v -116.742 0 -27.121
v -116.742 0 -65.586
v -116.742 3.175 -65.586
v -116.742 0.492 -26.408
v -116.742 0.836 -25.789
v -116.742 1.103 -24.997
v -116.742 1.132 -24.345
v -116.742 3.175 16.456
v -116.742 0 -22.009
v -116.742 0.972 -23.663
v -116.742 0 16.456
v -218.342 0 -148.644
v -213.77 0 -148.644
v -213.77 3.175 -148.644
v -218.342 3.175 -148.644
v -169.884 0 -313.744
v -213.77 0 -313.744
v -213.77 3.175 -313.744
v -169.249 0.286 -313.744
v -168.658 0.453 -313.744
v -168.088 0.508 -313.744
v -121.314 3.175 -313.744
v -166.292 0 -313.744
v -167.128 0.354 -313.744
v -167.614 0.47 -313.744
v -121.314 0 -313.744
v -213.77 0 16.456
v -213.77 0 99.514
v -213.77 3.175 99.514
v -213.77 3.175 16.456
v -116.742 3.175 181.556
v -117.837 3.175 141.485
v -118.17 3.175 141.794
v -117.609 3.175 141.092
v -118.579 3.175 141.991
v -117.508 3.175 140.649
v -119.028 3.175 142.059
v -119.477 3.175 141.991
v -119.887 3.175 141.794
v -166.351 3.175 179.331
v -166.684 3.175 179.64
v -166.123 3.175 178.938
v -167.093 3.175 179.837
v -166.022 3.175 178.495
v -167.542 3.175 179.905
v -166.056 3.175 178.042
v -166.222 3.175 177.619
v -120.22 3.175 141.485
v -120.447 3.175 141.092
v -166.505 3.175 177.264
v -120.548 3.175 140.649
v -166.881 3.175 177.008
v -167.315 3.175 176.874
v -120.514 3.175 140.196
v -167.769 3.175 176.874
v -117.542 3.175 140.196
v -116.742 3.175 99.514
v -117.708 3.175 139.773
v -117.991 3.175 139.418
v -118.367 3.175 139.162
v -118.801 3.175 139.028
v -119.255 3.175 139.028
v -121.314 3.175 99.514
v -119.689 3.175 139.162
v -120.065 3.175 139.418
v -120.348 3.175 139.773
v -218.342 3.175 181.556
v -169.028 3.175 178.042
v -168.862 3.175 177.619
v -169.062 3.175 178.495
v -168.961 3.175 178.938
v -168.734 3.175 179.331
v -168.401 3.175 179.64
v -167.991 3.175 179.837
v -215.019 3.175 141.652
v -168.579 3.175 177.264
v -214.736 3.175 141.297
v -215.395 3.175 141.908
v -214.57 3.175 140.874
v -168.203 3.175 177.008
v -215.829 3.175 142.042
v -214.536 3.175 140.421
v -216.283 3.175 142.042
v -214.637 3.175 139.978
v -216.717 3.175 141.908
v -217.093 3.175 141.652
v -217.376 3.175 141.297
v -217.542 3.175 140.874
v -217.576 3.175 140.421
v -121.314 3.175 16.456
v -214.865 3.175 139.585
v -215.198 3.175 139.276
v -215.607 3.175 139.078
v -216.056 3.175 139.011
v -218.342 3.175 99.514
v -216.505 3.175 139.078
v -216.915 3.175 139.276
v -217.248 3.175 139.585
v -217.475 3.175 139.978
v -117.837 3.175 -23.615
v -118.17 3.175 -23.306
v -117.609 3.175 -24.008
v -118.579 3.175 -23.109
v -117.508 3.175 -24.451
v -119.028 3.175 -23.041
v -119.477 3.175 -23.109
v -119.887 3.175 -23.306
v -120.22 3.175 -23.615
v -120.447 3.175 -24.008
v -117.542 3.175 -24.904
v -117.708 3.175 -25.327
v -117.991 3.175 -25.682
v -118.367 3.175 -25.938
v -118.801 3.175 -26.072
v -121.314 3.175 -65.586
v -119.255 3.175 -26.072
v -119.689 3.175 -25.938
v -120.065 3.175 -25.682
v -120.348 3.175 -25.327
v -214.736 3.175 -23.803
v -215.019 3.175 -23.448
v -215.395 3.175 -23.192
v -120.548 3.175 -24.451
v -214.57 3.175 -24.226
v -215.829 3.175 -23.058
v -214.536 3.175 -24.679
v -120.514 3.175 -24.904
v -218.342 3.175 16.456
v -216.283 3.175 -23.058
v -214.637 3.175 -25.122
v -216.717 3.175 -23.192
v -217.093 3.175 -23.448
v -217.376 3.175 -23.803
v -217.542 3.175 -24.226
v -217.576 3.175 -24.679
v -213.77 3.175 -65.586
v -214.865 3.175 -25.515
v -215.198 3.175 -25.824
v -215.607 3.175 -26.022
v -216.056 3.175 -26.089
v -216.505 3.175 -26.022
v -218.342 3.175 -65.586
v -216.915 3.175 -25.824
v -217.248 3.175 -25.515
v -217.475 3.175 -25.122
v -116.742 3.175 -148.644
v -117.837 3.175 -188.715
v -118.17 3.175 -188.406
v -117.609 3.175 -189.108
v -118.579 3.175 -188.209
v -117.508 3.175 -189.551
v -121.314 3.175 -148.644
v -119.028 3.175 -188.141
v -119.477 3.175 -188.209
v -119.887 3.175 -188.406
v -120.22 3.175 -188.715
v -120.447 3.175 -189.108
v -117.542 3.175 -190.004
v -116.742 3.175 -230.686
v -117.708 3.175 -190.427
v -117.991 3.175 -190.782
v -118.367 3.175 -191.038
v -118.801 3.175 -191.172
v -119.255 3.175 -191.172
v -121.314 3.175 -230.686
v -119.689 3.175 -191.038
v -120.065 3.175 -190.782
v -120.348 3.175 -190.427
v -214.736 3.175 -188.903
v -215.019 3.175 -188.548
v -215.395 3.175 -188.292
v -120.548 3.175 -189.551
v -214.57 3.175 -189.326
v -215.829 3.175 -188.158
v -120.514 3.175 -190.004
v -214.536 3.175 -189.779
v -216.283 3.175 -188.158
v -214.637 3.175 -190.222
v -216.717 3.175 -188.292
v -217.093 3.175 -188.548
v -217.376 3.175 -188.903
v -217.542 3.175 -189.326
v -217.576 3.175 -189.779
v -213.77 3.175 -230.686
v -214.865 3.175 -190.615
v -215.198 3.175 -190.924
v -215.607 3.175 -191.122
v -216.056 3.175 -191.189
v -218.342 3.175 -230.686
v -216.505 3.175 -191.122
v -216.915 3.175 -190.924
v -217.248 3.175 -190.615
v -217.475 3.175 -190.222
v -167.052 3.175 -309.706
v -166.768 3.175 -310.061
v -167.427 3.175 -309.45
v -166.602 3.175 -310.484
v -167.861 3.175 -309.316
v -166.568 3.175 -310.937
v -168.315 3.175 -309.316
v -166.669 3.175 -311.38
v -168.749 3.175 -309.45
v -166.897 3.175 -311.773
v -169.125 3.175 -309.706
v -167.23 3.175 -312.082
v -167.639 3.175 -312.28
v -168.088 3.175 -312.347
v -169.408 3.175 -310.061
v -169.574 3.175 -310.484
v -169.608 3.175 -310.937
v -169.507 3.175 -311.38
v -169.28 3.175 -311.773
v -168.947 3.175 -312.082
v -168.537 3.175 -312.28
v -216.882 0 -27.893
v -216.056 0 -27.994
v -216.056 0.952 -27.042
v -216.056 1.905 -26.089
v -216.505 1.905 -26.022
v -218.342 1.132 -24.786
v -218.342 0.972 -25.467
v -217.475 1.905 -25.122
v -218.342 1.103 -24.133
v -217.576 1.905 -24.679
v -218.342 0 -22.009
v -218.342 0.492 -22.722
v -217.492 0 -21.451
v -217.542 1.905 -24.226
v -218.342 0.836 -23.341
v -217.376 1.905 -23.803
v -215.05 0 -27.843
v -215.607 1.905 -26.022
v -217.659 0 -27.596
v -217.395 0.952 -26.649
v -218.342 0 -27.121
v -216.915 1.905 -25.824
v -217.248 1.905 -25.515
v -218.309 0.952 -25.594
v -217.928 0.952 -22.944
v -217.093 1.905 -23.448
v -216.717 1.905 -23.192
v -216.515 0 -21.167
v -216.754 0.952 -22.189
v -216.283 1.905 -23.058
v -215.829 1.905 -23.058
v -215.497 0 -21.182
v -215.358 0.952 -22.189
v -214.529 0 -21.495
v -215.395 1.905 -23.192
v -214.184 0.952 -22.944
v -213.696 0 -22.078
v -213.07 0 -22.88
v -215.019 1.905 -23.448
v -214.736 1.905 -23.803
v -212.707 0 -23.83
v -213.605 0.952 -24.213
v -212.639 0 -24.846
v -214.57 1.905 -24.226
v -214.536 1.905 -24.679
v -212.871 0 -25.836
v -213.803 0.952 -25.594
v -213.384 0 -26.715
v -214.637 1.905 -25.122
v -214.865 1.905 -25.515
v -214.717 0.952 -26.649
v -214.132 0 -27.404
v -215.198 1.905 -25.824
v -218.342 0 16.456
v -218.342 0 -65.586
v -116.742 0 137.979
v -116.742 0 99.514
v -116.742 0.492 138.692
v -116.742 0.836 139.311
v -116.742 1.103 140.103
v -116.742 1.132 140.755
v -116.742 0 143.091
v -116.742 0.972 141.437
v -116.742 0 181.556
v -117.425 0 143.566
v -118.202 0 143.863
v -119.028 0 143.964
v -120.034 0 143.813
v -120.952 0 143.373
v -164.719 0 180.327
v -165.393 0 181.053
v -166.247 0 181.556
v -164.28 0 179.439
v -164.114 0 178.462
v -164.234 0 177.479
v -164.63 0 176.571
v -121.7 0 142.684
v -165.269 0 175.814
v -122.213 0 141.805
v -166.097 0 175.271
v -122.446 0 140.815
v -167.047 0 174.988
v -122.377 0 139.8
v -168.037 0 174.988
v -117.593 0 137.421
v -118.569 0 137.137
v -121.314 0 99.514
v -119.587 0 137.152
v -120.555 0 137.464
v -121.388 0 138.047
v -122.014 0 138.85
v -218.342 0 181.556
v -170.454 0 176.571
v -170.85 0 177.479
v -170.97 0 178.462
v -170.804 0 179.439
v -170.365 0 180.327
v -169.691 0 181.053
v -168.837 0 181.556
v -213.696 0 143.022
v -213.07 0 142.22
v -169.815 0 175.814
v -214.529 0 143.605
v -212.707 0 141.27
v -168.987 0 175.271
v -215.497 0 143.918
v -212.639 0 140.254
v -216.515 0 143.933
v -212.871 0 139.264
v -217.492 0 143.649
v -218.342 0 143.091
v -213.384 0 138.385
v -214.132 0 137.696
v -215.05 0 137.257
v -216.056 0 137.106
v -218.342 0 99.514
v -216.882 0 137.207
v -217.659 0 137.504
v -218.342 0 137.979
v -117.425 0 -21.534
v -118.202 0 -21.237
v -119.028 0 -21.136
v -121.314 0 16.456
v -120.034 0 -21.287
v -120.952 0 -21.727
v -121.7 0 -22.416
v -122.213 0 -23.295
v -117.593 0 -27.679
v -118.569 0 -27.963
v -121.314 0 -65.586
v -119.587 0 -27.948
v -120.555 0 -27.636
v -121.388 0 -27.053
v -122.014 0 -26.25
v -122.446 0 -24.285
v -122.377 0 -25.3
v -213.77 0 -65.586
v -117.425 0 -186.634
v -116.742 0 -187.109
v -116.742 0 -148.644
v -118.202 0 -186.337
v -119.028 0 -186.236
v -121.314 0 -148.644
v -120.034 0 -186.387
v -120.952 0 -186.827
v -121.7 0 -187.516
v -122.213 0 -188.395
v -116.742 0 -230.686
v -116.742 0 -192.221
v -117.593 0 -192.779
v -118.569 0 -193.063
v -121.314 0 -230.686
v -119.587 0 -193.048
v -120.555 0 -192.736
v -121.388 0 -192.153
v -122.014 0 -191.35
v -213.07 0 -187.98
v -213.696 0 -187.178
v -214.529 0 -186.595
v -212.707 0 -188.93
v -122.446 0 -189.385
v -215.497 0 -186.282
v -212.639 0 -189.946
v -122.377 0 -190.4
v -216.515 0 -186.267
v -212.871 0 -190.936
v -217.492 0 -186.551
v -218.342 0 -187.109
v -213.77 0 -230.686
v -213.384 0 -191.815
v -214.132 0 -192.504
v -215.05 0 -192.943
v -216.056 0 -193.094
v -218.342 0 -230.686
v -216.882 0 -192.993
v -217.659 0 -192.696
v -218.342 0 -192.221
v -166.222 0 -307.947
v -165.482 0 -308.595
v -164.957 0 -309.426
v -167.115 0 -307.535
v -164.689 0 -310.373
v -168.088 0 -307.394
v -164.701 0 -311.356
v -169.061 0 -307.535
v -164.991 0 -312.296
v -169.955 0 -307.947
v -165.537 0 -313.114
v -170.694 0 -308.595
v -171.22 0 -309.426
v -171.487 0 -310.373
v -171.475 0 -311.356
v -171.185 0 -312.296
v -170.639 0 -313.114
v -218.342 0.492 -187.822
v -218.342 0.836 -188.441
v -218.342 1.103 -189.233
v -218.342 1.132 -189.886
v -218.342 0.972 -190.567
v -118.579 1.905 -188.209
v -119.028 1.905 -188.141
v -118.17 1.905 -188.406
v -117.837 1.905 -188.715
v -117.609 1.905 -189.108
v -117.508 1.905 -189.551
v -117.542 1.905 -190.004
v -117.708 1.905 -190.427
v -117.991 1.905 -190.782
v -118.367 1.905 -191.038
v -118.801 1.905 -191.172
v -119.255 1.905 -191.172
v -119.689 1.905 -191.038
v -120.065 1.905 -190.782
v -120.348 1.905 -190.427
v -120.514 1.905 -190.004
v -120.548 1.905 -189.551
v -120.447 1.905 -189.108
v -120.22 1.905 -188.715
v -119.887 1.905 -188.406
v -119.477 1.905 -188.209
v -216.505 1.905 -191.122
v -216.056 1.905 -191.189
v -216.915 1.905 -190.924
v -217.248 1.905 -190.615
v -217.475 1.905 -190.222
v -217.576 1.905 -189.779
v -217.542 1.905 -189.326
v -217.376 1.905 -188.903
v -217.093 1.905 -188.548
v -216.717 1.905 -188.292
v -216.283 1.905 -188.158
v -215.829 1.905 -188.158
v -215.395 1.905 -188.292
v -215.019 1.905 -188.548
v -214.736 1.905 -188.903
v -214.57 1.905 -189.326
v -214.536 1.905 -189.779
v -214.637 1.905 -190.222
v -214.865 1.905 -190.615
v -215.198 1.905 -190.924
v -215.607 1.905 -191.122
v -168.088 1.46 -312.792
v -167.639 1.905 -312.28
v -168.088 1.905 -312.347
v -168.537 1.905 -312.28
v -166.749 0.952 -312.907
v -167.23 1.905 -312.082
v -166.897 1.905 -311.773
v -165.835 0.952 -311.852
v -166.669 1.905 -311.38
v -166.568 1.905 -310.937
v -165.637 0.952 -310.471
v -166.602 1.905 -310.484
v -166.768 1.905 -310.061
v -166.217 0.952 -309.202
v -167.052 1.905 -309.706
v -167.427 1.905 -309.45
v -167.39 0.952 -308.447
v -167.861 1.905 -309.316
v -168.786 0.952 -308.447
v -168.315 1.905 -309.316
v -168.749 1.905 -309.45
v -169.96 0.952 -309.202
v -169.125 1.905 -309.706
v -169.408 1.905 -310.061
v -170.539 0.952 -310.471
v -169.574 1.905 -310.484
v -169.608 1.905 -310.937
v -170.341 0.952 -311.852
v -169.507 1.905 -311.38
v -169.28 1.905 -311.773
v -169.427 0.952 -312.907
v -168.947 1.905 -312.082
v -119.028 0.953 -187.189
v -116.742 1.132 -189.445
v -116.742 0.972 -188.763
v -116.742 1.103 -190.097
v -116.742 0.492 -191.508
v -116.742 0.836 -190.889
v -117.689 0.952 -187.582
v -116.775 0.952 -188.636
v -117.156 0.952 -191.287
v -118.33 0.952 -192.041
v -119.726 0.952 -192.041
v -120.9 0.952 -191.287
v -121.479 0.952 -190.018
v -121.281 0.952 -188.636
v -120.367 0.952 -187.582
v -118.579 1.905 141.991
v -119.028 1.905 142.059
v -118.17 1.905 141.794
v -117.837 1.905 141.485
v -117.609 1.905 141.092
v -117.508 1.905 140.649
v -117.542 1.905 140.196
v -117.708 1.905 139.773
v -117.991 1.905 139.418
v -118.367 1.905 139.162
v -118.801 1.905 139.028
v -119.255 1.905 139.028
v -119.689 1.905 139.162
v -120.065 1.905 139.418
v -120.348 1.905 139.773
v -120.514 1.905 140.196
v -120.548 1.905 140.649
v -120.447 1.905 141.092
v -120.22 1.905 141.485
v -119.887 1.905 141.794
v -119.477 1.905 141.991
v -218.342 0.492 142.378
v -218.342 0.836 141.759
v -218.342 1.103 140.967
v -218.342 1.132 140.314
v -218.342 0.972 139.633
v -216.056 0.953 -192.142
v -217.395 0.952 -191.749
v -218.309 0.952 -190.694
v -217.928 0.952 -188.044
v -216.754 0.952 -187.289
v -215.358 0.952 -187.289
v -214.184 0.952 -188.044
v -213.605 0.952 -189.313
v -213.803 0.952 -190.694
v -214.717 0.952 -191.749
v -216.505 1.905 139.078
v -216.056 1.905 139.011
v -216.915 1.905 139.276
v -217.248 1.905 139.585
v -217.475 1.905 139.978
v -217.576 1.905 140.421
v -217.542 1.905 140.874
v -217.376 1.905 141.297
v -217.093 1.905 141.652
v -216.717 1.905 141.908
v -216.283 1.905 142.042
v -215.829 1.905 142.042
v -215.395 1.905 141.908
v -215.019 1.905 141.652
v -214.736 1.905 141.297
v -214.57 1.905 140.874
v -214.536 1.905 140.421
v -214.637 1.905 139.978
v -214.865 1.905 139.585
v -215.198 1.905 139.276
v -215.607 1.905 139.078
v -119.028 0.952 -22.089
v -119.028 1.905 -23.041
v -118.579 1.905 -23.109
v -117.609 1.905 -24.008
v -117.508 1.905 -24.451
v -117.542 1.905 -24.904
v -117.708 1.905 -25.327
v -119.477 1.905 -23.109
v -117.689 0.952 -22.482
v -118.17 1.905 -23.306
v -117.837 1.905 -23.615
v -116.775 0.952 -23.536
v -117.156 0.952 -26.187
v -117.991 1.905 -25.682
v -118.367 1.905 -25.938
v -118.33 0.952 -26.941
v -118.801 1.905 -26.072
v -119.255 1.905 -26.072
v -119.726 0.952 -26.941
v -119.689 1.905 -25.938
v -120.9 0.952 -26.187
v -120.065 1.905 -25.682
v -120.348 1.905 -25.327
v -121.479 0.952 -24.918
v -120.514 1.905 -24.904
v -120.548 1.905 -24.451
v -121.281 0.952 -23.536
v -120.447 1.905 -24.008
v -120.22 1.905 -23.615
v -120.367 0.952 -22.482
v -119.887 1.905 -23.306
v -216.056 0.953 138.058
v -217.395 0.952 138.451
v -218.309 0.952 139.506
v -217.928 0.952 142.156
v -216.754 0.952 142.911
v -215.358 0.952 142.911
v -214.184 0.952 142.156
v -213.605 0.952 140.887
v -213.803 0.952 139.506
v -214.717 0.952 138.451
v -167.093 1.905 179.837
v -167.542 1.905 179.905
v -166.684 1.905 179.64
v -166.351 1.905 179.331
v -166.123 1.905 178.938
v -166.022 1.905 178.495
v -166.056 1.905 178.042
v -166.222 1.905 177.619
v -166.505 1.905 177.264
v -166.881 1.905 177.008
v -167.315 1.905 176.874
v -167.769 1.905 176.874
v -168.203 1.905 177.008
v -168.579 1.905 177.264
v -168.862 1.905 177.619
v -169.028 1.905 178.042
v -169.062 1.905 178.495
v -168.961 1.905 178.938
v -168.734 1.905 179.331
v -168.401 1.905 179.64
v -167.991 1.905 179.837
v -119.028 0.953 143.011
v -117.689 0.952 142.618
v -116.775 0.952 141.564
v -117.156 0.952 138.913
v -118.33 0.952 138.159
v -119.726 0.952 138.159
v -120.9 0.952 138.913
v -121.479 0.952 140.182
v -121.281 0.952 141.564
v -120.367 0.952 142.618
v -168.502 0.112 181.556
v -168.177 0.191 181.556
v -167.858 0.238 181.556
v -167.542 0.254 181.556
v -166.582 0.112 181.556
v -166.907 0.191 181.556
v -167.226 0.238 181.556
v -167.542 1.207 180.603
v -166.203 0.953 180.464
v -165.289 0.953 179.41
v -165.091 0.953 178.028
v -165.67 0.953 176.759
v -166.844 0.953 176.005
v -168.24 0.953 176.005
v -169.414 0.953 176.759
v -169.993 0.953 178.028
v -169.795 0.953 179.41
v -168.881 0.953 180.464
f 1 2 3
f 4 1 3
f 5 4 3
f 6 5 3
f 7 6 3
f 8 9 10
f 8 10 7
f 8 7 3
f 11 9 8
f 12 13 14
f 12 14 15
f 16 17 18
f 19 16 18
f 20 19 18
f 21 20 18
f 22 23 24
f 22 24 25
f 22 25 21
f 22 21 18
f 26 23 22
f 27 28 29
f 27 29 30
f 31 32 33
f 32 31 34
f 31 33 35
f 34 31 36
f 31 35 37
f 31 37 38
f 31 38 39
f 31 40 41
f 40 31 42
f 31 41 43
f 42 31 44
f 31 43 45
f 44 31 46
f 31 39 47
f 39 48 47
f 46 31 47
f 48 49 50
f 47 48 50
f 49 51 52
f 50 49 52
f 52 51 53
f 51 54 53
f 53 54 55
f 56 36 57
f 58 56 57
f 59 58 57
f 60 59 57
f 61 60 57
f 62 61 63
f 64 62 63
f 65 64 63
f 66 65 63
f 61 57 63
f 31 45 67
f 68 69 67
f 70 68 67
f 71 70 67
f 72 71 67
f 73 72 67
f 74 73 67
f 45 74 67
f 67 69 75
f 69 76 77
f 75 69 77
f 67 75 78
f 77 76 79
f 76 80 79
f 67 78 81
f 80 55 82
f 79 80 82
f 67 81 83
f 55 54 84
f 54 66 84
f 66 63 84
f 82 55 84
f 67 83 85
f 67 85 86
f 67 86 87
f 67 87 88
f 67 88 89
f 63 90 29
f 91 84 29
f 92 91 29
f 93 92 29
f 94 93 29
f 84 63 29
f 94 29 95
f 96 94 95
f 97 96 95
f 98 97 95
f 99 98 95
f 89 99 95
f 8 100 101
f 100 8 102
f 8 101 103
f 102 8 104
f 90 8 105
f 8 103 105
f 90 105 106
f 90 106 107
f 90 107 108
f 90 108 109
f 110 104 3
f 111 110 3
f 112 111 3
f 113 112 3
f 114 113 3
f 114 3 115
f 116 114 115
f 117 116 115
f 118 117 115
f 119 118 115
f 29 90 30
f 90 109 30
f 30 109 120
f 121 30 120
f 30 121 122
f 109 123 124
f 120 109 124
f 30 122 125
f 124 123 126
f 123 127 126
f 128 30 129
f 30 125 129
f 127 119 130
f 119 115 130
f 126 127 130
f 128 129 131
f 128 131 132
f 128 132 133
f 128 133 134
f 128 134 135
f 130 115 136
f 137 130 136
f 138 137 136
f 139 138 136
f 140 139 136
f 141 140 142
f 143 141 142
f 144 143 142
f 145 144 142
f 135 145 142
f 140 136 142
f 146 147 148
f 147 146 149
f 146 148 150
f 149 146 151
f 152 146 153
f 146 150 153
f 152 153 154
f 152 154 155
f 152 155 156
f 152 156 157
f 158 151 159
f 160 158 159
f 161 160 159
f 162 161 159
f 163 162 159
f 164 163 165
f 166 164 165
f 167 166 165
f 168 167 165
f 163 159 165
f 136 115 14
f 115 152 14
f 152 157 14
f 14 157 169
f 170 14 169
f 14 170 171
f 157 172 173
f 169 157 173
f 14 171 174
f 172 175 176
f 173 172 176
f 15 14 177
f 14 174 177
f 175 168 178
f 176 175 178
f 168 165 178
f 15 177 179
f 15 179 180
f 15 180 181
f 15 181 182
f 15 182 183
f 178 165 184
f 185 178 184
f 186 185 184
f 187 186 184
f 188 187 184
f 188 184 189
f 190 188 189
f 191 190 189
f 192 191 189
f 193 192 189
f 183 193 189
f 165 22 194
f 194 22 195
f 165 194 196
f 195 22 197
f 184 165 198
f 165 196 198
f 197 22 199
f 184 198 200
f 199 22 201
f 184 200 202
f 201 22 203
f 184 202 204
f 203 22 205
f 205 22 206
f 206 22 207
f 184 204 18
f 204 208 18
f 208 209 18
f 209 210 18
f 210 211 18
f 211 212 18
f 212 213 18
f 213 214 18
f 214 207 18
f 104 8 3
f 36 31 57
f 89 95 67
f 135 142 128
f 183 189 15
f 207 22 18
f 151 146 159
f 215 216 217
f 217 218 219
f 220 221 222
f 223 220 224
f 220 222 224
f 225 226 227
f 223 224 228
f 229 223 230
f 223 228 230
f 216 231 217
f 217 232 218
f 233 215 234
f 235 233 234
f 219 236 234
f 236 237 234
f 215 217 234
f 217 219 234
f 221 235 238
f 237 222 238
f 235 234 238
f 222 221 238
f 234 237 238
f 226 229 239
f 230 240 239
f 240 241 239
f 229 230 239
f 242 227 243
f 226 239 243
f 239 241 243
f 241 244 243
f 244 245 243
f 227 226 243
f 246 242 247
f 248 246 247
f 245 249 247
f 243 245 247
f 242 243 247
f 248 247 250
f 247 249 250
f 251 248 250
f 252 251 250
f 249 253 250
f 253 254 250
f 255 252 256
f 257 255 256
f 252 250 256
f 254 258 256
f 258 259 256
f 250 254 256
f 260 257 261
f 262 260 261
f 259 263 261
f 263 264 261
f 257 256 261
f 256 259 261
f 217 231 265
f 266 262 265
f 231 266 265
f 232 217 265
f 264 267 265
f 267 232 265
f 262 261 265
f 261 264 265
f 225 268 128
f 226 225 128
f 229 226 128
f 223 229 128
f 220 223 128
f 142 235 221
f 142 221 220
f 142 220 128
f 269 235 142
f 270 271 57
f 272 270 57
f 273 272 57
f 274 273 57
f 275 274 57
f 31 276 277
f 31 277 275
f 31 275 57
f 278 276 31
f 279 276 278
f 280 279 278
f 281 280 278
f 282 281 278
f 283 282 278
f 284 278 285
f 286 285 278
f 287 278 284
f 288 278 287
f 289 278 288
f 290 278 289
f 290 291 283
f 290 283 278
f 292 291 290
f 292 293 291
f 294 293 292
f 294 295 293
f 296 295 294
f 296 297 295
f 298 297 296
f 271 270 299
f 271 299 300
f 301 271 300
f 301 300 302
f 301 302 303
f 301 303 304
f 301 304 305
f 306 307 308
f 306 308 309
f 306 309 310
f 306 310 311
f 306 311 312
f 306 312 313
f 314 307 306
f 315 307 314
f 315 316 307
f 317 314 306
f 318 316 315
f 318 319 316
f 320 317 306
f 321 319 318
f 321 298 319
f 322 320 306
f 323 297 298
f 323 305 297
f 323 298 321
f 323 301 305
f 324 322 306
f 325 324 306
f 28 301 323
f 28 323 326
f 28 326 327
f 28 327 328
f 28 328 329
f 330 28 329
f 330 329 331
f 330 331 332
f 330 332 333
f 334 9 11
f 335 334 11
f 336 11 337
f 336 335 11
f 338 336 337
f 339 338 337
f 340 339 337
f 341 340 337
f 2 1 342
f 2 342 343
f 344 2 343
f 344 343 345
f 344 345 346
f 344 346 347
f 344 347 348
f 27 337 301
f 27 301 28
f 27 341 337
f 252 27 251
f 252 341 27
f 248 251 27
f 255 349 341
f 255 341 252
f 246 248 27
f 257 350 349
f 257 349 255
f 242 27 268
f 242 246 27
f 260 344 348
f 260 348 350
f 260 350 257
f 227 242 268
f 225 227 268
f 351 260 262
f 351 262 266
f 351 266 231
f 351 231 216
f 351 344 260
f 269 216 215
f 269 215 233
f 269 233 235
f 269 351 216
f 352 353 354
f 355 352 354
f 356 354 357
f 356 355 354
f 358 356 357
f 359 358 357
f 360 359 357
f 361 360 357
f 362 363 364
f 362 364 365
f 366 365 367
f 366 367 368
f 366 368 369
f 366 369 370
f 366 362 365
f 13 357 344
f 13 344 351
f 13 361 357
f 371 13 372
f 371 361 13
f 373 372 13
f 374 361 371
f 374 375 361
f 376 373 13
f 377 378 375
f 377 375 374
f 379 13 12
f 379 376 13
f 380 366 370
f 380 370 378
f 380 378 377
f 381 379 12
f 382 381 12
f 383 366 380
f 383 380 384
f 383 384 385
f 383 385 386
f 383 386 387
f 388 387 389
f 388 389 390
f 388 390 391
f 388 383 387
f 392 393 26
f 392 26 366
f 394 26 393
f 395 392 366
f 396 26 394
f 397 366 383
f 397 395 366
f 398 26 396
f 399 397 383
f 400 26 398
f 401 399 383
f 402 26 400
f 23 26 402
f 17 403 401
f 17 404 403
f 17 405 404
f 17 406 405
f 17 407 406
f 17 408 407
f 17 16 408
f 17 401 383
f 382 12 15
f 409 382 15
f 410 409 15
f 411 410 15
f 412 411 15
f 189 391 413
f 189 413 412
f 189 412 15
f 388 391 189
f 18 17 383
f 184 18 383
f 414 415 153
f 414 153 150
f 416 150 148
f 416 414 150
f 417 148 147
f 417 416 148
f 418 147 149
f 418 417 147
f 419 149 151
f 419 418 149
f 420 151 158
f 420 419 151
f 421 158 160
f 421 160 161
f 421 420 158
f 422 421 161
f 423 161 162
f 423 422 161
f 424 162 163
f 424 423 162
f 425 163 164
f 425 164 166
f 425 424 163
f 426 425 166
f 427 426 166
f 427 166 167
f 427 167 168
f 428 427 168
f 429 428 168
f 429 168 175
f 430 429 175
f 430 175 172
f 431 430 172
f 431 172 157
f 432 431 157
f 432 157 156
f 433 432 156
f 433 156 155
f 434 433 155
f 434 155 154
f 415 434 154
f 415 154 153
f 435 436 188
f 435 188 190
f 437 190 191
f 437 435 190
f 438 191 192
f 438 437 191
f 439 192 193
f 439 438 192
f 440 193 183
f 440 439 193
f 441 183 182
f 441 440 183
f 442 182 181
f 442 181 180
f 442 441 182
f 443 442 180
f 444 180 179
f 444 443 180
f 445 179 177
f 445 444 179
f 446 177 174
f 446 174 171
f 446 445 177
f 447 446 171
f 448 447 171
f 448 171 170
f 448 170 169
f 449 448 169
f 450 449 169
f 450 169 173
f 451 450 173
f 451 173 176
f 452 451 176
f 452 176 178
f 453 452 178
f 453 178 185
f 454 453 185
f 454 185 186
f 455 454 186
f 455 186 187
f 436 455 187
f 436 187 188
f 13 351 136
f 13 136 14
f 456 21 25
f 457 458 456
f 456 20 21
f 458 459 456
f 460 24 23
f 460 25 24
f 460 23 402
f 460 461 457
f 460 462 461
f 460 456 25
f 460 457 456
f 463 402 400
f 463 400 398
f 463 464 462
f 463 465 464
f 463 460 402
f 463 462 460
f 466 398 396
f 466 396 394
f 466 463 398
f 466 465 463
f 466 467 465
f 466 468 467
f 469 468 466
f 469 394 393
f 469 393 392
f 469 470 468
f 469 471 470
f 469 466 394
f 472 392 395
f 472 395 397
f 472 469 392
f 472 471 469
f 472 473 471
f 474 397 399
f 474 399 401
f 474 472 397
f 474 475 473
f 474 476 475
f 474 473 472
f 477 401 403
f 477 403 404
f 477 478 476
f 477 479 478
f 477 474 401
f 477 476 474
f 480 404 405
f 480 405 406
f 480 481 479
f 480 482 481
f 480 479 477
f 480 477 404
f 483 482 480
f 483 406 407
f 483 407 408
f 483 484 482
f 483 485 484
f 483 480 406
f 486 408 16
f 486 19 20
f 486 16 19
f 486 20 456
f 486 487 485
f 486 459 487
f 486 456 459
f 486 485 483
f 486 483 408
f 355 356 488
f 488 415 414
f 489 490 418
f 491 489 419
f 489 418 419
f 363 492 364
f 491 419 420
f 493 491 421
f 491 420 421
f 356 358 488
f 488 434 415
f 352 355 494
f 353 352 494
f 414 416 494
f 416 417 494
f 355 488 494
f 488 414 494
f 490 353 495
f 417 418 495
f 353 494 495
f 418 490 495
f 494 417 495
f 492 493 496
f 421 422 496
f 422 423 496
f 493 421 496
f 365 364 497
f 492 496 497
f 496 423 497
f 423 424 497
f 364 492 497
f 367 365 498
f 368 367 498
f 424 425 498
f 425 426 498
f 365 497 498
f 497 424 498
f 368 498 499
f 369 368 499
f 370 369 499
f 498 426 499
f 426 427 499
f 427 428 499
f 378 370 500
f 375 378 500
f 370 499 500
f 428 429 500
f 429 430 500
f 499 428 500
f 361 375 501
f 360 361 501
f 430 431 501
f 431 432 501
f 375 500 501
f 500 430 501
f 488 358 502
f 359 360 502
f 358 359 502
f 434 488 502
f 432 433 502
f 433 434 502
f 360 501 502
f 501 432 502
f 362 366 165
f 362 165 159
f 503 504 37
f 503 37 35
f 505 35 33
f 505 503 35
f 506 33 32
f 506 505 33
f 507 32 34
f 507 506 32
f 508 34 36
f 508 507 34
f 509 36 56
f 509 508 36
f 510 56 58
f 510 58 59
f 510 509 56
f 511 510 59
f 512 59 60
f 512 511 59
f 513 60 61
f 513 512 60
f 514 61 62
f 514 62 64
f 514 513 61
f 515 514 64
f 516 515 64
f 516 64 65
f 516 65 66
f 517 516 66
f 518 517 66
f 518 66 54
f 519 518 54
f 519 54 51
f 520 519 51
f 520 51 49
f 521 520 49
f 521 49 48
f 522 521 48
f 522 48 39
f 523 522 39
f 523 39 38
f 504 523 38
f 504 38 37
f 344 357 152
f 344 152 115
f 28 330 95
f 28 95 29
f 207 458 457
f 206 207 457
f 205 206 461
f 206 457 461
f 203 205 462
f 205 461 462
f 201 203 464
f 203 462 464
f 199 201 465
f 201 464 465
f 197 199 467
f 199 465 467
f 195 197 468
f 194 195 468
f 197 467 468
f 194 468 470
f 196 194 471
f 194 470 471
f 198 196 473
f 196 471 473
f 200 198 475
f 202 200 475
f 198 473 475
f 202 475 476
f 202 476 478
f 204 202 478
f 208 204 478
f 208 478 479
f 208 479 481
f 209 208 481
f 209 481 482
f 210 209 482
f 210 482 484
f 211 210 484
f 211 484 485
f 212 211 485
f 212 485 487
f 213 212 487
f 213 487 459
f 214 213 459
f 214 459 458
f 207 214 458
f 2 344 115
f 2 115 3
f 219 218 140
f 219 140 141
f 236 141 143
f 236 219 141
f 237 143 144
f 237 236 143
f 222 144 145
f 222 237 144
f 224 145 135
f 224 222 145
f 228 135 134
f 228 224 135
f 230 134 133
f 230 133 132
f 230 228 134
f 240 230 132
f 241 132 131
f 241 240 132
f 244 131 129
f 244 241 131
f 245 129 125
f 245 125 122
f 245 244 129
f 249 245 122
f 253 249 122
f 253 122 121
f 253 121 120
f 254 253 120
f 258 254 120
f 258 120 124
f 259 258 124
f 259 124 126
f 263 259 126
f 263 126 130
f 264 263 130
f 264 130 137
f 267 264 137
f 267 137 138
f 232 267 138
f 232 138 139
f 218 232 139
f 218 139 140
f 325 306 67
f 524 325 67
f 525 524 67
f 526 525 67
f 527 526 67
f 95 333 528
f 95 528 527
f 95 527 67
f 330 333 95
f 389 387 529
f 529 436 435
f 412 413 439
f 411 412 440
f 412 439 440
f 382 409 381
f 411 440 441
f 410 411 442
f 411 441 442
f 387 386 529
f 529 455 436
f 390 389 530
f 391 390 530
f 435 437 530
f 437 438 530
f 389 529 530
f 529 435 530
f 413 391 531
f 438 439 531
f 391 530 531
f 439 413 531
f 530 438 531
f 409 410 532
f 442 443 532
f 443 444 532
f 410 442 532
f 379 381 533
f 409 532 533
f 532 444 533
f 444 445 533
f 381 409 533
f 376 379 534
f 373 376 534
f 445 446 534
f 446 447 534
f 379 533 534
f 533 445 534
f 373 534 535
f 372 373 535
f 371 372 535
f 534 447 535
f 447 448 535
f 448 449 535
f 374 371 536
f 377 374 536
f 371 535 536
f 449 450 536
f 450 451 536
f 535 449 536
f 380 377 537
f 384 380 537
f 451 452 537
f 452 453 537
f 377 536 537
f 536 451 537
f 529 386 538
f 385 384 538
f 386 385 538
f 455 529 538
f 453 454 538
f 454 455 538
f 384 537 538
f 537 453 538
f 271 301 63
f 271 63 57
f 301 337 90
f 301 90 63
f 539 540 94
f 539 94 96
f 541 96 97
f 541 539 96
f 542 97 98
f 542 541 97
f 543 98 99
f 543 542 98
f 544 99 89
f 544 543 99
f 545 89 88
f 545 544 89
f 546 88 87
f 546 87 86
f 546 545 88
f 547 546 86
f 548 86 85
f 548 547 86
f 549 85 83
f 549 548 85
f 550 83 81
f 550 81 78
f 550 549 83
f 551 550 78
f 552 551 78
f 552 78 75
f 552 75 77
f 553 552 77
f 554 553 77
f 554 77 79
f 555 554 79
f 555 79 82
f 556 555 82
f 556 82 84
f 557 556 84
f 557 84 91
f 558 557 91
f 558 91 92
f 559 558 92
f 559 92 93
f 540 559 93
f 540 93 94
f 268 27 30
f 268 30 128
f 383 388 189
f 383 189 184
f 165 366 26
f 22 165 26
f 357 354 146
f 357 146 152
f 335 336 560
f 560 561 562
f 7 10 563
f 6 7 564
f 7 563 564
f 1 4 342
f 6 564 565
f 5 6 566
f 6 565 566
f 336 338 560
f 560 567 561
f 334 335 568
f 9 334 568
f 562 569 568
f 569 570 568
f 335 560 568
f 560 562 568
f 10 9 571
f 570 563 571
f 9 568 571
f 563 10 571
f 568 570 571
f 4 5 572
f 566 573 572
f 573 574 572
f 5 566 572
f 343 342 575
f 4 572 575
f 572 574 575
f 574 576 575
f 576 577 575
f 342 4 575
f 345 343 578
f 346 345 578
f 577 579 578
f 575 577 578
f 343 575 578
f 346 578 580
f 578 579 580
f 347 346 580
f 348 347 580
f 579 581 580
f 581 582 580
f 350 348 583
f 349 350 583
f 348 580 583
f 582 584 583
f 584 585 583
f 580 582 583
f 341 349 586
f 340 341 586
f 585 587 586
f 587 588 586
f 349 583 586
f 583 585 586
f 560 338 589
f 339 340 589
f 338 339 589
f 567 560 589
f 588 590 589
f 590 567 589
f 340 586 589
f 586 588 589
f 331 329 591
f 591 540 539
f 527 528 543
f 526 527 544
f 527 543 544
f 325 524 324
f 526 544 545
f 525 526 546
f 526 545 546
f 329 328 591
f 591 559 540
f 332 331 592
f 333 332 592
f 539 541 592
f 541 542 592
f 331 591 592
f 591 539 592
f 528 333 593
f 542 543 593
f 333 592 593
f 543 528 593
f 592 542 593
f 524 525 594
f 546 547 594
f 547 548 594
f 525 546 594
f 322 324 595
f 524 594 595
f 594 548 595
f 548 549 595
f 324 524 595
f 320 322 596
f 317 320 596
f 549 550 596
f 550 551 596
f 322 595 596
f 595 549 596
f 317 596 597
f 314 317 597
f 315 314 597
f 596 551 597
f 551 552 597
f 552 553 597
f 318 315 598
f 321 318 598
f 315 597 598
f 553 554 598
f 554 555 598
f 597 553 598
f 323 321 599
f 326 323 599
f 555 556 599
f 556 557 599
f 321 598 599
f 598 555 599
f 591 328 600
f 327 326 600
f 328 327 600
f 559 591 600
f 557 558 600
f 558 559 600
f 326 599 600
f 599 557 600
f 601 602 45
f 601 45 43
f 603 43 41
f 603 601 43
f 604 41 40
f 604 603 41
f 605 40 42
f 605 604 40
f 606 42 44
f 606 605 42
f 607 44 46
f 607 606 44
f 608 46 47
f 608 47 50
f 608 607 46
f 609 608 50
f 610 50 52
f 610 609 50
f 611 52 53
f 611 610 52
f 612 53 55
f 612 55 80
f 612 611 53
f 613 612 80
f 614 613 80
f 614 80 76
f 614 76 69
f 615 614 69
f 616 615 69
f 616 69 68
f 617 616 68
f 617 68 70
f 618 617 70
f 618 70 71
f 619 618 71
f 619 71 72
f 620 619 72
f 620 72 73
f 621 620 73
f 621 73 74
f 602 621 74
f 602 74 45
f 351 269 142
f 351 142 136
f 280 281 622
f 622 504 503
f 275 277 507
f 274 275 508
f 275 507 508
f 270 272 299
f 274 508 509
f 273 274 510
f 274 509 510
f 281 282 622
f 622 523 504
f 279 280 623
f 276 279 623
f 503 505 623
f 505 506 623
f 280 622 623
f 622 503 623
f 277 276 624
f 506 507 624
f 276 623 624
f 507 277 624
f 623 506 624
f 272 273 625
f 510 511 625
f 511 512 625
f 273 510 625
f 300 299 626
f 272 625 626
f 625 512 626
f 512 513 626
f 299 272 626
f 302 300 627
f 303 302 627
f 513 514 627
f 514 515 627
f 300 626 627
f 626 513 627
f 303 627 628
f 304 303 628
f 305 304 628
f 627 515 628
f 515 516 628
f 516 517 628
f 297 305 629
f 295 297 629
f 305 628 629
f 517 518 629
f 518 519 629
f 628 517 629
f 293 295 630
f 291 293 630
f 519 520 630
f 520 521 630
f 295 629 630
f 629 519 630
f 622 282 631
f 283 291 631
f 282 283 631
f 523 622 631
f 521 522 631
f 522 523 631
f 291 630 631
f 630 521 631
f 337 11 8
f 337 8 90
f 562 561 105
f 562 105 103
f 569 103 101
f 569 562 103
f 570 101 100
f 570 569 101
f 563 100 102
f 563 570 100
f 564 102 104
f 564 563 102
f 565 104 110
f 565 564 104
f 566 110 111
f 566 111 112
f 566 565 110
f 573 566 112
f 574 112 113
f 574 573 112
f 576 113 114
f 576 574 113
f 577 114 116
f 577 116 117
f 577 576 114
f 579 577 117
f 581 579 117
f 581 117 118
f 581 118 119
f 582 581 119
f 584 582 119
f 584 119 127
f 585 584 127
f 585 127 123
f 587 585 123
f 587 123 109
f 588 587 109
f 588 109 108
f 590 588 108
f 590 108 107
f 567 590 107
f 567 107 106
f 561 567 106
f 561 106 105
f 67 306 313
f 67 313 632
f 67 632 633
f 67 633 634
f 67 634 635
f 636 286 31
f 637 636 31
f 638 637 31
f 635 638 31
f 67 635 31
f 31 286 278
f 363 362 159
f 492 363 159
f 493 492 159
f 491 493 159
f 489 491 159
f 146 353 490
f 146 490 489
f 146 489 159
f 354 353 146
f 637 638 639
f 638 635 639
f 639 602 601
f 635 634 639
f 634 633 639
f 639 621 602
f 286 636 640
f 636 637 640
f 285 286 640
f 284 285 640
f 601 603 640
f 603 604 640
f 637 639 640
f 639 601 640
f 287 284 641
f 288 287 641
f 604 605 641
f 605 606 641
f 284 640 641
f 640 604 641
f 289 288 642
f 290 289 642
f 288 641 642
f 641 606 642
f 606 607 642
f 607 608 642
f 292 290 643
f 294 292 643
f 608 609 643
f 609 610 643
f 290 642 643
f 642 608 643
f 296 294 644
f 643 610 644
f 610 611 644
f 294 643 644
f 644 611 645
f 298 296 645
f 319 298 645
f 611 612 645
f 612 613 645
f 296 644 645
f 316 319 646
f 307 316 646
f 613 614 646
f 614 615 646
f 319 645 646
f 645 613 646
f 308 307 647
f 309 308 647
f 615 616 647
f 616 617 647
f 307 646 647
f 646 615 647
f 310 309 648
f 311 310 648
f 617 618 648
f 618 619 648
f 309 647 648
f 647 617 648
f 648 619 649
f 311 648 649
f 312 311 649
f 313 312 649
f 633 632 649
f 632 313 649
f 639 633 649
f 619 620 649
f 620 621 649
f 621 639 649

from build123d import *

# Parameters (mm, degrees)
SKETCH1_R           = 1.524
BOSS_EXTRUDE1_DEPTH = 3.175
SKETCH2_R           = 1.524
CUT_EXTRUDE1_DEPTH  = 12.7
CHAMFER1_SIZE       = 1.905


with BuildPart() as part:
    # Sketch1 → Boss-Extrude1 (new body)
    with BuildSketch(Plane(origin=(0, 0, 0), x_dir=(1, 0, 0), z_dir=(0, 1, 0))):
        Polygon((-116.742050037, 65.586269915), (-116.742050037, -16.455730085), (-121.314050037, -16.455730085), (-121.314050037, -99.513730085), (-116.742050037, -99.513730085), (-116.742050037, -181.555730085), (-121.314050037, -181.555730085), (-213.770050037, -181.555730085), (-218.342050037, -181.555730085), (-218.342050037, -99.513730085), (-213.770050037, -99.513730085), (-213.770050037, -16.455730085), (-218.342050037, -16.455730085), (-218.342050037, 65.586269915), (-213.770050037, 65.586269915), (-213.770050037, 148.644269915), (-218.342050037, 148.644269915), (-218.342050037, 230.686269915), (-213.770050037, 230.686269915), (-213.770050037, 307.394269915), (-213.770050037, 313.744269915), (-121.314050037, 313.744269915), (-121.314050037, 307.394269915), (-121.314050037, 230.686269915), (-116.742050037, 230.686269915), (-116.742050037, 148.644269915), (-121.314050037, 148.644269915), (-121.314050037, 65.586269915), align=None)
        with Locations(Location((-119.028050037, 189.665269915, 0), (0, 0, 270))):
            Circle(SKETCH1_R, mode=Mode.SUBTRACT)
        with Locations(Location((-119.028050037, 24.565269915, 0), (0, 0, 270))):
            Circle(SKETCH1_R, mode=Mode.SUBTRACT)
        with Locations(Location((-119.028050037, -140.534730085, 0), (0, 0, 270))):
            Circle(SKETCH1_R, mode=Mode.SUBTRACT)
        with Locations(Location((-216.056050037, 189.665269915, 0), (0, 0, 90))):
            Circle(SKETCH1_R, mode=Mode.SUBTRACT)
        with Locations(Location((-216.056050037, 24.565269915, 0), (0, 0, 90))):
            Circle(SKETCH1_R, mode=Mode.SUBTRACT)
        with Locations(Location((-216.056050037, -140.534730085, 0), (0, 0, 90))):
            Circle(SKETCH1_R, mode=Mode.SUBTRACT)
        with Locations(Location((-167.542050037, -178.380730085, 0), (0, 0, 270))):
            Circle(SKETCH1_R, mode=Mode.SUBTRACT)
    extrude(amount=BOSS_EXTRUDE1_DEPTH)

    # Sketch2 → Cut-Extrude1 (cut)
    with BuildSketch(Plane.XZ):
        with Locations(Location((-168.088150037, -310.823269915, 0), (0, 0, 270))):
            Circle(SKETCH2_R)
    extrude(amount=-CUT_EXTRUDE1_DEPTH, mode=Mode.SUBTRACT)

    # Chamfer1
    # the kernel refuses this chamfer: 1.905 mm, written as the material it takes off along each edge
    with BuildSketch(Plane(origin=(-168.088150037, 0, -310.823269915), x_dir=(0, 0, -1), z_dir=(-1, 0, 0))) as chamfer1_piece_1:
        Polygon((1.524 + CHAMFER1_SIZE, 0), (1.524, -CHAMFER1_SIZE), (1.524, 0), align=None)
    revolve(axis=Axis((-168.088150037, 0, -310.823269915), (0, -1, 0)), mode=Mode.SUBTRACT)
    with BuildSketch(Plane(origin=(-119.028050037, 0, -189.665269915), x_dir=(0, 0, 1), z_dir=(-1, 0, 0))) as chamfer1_piece_2:
        Polygon((1.524 + CHAMFER1_SIZE, 0), (1.524, CHAMFER1_SIZE), (1.524, 0), align=None)
    revolve(axis=Axis((-119.028050037, 0, -189.665269915), (0, 1, 0)), mode=Mode.SUBTRACT)
    with BuildSketch(Plane(origin=(-119.028050037, 0, -24.565269915), x_dir=(0, 0, 1), z_dir=(-1, 0, 0))) as chamfer1_piece_3:
        Polygon((1.524 + CHAMFER1_SIZE, 0), (1.524, CHAMFER1_SIZE), (1.524, 0), align=None)
    revolve(axis=Axis((-119.028050037, 0, -24.565269915), (0, 1, 0)), mode=Mode.SUBTRACT)
    with BuildSketch(Plane(origin=(-216.056050037, 0, -189.665269915), x_dir=(0, 0, -1), z_dir=(1, 0, 0))) as chamfer1_piece_4:
        Polygon((1.524 + CHAMFER1_SIZE, 0), (1.524, CHAMFER1_SIZE), (1.524, 0), align=None)
    revolve(axis=Axis((-216.056050037, 0, -189.665269915), (0, 1, 0)), mode=Mode.SUBTRACT)
    with BuildSketch(Plane(origin=(-119.028050037, 0, 140.534730085), x_dir=(0, 0, 1), z_dir=(-1, 0, 0))) as chamfer1_piece_5:
        Polygon((1.524 + CHAMFER1_SIZE, 0), (1.524, CHAMFER1_SIZE), (1.524, 0), align=None)
    revolve(axis=Axis((-119.028050037, 0, 140.534730085), (0, 1, 0)), mode=Mode.SUBTRACT)
    with BuildSketch(Plane(origin=(-216.056050037, 0, -24.565269915), x_dir=(0, 0, -1), z_dir=(1, 0, 0))) as chamfer1_piece_6:
        Polygon((1.524 + CHAMFER1_SIZE, 0), (1.524, CHAMFER1_SIZE), (1.524, 0), align=None)
    revolve(axis=Axis((-216.056050037, 0, -24.565269915), (0, 1, 0)), mode=Mode.SUBTRACT)
    with BuildSketch(Plane(origin=(-216.056050037, 0, 140.534730085), x_dir=(0, 0, -1), z_dir=(1, 0, 0))) as chamfer1_piece_7:
        Polygon((1.524 + CHAMFER1_SIZE, 0), (1.524, CHAMFER1_SIZE), (1.524, 0), align=None)
    revolve(axis=Axis((-216.056050037, 0, 140.534730085), (0, 1, 0)), mode=Mode.SUBTRACT)
    with BuildSketch(Plane(origin=(-167.542050037, 0, 178.380730085), x_dir=(0, 0, 1), z_dir=(-1, 0, 0))) as chamfer1_piece_8:
        Polygon((1.524 + CHAMFER1_SIZE, 0), (1.524, CHAMFER1_SIZE), (1.524, 0), align=None)
    revolve(axis=Axis((-167.542050037, 0, 178.380730085), (0, 1, 0)), mode=Mode.SUBTRACT)


solid = part.part
